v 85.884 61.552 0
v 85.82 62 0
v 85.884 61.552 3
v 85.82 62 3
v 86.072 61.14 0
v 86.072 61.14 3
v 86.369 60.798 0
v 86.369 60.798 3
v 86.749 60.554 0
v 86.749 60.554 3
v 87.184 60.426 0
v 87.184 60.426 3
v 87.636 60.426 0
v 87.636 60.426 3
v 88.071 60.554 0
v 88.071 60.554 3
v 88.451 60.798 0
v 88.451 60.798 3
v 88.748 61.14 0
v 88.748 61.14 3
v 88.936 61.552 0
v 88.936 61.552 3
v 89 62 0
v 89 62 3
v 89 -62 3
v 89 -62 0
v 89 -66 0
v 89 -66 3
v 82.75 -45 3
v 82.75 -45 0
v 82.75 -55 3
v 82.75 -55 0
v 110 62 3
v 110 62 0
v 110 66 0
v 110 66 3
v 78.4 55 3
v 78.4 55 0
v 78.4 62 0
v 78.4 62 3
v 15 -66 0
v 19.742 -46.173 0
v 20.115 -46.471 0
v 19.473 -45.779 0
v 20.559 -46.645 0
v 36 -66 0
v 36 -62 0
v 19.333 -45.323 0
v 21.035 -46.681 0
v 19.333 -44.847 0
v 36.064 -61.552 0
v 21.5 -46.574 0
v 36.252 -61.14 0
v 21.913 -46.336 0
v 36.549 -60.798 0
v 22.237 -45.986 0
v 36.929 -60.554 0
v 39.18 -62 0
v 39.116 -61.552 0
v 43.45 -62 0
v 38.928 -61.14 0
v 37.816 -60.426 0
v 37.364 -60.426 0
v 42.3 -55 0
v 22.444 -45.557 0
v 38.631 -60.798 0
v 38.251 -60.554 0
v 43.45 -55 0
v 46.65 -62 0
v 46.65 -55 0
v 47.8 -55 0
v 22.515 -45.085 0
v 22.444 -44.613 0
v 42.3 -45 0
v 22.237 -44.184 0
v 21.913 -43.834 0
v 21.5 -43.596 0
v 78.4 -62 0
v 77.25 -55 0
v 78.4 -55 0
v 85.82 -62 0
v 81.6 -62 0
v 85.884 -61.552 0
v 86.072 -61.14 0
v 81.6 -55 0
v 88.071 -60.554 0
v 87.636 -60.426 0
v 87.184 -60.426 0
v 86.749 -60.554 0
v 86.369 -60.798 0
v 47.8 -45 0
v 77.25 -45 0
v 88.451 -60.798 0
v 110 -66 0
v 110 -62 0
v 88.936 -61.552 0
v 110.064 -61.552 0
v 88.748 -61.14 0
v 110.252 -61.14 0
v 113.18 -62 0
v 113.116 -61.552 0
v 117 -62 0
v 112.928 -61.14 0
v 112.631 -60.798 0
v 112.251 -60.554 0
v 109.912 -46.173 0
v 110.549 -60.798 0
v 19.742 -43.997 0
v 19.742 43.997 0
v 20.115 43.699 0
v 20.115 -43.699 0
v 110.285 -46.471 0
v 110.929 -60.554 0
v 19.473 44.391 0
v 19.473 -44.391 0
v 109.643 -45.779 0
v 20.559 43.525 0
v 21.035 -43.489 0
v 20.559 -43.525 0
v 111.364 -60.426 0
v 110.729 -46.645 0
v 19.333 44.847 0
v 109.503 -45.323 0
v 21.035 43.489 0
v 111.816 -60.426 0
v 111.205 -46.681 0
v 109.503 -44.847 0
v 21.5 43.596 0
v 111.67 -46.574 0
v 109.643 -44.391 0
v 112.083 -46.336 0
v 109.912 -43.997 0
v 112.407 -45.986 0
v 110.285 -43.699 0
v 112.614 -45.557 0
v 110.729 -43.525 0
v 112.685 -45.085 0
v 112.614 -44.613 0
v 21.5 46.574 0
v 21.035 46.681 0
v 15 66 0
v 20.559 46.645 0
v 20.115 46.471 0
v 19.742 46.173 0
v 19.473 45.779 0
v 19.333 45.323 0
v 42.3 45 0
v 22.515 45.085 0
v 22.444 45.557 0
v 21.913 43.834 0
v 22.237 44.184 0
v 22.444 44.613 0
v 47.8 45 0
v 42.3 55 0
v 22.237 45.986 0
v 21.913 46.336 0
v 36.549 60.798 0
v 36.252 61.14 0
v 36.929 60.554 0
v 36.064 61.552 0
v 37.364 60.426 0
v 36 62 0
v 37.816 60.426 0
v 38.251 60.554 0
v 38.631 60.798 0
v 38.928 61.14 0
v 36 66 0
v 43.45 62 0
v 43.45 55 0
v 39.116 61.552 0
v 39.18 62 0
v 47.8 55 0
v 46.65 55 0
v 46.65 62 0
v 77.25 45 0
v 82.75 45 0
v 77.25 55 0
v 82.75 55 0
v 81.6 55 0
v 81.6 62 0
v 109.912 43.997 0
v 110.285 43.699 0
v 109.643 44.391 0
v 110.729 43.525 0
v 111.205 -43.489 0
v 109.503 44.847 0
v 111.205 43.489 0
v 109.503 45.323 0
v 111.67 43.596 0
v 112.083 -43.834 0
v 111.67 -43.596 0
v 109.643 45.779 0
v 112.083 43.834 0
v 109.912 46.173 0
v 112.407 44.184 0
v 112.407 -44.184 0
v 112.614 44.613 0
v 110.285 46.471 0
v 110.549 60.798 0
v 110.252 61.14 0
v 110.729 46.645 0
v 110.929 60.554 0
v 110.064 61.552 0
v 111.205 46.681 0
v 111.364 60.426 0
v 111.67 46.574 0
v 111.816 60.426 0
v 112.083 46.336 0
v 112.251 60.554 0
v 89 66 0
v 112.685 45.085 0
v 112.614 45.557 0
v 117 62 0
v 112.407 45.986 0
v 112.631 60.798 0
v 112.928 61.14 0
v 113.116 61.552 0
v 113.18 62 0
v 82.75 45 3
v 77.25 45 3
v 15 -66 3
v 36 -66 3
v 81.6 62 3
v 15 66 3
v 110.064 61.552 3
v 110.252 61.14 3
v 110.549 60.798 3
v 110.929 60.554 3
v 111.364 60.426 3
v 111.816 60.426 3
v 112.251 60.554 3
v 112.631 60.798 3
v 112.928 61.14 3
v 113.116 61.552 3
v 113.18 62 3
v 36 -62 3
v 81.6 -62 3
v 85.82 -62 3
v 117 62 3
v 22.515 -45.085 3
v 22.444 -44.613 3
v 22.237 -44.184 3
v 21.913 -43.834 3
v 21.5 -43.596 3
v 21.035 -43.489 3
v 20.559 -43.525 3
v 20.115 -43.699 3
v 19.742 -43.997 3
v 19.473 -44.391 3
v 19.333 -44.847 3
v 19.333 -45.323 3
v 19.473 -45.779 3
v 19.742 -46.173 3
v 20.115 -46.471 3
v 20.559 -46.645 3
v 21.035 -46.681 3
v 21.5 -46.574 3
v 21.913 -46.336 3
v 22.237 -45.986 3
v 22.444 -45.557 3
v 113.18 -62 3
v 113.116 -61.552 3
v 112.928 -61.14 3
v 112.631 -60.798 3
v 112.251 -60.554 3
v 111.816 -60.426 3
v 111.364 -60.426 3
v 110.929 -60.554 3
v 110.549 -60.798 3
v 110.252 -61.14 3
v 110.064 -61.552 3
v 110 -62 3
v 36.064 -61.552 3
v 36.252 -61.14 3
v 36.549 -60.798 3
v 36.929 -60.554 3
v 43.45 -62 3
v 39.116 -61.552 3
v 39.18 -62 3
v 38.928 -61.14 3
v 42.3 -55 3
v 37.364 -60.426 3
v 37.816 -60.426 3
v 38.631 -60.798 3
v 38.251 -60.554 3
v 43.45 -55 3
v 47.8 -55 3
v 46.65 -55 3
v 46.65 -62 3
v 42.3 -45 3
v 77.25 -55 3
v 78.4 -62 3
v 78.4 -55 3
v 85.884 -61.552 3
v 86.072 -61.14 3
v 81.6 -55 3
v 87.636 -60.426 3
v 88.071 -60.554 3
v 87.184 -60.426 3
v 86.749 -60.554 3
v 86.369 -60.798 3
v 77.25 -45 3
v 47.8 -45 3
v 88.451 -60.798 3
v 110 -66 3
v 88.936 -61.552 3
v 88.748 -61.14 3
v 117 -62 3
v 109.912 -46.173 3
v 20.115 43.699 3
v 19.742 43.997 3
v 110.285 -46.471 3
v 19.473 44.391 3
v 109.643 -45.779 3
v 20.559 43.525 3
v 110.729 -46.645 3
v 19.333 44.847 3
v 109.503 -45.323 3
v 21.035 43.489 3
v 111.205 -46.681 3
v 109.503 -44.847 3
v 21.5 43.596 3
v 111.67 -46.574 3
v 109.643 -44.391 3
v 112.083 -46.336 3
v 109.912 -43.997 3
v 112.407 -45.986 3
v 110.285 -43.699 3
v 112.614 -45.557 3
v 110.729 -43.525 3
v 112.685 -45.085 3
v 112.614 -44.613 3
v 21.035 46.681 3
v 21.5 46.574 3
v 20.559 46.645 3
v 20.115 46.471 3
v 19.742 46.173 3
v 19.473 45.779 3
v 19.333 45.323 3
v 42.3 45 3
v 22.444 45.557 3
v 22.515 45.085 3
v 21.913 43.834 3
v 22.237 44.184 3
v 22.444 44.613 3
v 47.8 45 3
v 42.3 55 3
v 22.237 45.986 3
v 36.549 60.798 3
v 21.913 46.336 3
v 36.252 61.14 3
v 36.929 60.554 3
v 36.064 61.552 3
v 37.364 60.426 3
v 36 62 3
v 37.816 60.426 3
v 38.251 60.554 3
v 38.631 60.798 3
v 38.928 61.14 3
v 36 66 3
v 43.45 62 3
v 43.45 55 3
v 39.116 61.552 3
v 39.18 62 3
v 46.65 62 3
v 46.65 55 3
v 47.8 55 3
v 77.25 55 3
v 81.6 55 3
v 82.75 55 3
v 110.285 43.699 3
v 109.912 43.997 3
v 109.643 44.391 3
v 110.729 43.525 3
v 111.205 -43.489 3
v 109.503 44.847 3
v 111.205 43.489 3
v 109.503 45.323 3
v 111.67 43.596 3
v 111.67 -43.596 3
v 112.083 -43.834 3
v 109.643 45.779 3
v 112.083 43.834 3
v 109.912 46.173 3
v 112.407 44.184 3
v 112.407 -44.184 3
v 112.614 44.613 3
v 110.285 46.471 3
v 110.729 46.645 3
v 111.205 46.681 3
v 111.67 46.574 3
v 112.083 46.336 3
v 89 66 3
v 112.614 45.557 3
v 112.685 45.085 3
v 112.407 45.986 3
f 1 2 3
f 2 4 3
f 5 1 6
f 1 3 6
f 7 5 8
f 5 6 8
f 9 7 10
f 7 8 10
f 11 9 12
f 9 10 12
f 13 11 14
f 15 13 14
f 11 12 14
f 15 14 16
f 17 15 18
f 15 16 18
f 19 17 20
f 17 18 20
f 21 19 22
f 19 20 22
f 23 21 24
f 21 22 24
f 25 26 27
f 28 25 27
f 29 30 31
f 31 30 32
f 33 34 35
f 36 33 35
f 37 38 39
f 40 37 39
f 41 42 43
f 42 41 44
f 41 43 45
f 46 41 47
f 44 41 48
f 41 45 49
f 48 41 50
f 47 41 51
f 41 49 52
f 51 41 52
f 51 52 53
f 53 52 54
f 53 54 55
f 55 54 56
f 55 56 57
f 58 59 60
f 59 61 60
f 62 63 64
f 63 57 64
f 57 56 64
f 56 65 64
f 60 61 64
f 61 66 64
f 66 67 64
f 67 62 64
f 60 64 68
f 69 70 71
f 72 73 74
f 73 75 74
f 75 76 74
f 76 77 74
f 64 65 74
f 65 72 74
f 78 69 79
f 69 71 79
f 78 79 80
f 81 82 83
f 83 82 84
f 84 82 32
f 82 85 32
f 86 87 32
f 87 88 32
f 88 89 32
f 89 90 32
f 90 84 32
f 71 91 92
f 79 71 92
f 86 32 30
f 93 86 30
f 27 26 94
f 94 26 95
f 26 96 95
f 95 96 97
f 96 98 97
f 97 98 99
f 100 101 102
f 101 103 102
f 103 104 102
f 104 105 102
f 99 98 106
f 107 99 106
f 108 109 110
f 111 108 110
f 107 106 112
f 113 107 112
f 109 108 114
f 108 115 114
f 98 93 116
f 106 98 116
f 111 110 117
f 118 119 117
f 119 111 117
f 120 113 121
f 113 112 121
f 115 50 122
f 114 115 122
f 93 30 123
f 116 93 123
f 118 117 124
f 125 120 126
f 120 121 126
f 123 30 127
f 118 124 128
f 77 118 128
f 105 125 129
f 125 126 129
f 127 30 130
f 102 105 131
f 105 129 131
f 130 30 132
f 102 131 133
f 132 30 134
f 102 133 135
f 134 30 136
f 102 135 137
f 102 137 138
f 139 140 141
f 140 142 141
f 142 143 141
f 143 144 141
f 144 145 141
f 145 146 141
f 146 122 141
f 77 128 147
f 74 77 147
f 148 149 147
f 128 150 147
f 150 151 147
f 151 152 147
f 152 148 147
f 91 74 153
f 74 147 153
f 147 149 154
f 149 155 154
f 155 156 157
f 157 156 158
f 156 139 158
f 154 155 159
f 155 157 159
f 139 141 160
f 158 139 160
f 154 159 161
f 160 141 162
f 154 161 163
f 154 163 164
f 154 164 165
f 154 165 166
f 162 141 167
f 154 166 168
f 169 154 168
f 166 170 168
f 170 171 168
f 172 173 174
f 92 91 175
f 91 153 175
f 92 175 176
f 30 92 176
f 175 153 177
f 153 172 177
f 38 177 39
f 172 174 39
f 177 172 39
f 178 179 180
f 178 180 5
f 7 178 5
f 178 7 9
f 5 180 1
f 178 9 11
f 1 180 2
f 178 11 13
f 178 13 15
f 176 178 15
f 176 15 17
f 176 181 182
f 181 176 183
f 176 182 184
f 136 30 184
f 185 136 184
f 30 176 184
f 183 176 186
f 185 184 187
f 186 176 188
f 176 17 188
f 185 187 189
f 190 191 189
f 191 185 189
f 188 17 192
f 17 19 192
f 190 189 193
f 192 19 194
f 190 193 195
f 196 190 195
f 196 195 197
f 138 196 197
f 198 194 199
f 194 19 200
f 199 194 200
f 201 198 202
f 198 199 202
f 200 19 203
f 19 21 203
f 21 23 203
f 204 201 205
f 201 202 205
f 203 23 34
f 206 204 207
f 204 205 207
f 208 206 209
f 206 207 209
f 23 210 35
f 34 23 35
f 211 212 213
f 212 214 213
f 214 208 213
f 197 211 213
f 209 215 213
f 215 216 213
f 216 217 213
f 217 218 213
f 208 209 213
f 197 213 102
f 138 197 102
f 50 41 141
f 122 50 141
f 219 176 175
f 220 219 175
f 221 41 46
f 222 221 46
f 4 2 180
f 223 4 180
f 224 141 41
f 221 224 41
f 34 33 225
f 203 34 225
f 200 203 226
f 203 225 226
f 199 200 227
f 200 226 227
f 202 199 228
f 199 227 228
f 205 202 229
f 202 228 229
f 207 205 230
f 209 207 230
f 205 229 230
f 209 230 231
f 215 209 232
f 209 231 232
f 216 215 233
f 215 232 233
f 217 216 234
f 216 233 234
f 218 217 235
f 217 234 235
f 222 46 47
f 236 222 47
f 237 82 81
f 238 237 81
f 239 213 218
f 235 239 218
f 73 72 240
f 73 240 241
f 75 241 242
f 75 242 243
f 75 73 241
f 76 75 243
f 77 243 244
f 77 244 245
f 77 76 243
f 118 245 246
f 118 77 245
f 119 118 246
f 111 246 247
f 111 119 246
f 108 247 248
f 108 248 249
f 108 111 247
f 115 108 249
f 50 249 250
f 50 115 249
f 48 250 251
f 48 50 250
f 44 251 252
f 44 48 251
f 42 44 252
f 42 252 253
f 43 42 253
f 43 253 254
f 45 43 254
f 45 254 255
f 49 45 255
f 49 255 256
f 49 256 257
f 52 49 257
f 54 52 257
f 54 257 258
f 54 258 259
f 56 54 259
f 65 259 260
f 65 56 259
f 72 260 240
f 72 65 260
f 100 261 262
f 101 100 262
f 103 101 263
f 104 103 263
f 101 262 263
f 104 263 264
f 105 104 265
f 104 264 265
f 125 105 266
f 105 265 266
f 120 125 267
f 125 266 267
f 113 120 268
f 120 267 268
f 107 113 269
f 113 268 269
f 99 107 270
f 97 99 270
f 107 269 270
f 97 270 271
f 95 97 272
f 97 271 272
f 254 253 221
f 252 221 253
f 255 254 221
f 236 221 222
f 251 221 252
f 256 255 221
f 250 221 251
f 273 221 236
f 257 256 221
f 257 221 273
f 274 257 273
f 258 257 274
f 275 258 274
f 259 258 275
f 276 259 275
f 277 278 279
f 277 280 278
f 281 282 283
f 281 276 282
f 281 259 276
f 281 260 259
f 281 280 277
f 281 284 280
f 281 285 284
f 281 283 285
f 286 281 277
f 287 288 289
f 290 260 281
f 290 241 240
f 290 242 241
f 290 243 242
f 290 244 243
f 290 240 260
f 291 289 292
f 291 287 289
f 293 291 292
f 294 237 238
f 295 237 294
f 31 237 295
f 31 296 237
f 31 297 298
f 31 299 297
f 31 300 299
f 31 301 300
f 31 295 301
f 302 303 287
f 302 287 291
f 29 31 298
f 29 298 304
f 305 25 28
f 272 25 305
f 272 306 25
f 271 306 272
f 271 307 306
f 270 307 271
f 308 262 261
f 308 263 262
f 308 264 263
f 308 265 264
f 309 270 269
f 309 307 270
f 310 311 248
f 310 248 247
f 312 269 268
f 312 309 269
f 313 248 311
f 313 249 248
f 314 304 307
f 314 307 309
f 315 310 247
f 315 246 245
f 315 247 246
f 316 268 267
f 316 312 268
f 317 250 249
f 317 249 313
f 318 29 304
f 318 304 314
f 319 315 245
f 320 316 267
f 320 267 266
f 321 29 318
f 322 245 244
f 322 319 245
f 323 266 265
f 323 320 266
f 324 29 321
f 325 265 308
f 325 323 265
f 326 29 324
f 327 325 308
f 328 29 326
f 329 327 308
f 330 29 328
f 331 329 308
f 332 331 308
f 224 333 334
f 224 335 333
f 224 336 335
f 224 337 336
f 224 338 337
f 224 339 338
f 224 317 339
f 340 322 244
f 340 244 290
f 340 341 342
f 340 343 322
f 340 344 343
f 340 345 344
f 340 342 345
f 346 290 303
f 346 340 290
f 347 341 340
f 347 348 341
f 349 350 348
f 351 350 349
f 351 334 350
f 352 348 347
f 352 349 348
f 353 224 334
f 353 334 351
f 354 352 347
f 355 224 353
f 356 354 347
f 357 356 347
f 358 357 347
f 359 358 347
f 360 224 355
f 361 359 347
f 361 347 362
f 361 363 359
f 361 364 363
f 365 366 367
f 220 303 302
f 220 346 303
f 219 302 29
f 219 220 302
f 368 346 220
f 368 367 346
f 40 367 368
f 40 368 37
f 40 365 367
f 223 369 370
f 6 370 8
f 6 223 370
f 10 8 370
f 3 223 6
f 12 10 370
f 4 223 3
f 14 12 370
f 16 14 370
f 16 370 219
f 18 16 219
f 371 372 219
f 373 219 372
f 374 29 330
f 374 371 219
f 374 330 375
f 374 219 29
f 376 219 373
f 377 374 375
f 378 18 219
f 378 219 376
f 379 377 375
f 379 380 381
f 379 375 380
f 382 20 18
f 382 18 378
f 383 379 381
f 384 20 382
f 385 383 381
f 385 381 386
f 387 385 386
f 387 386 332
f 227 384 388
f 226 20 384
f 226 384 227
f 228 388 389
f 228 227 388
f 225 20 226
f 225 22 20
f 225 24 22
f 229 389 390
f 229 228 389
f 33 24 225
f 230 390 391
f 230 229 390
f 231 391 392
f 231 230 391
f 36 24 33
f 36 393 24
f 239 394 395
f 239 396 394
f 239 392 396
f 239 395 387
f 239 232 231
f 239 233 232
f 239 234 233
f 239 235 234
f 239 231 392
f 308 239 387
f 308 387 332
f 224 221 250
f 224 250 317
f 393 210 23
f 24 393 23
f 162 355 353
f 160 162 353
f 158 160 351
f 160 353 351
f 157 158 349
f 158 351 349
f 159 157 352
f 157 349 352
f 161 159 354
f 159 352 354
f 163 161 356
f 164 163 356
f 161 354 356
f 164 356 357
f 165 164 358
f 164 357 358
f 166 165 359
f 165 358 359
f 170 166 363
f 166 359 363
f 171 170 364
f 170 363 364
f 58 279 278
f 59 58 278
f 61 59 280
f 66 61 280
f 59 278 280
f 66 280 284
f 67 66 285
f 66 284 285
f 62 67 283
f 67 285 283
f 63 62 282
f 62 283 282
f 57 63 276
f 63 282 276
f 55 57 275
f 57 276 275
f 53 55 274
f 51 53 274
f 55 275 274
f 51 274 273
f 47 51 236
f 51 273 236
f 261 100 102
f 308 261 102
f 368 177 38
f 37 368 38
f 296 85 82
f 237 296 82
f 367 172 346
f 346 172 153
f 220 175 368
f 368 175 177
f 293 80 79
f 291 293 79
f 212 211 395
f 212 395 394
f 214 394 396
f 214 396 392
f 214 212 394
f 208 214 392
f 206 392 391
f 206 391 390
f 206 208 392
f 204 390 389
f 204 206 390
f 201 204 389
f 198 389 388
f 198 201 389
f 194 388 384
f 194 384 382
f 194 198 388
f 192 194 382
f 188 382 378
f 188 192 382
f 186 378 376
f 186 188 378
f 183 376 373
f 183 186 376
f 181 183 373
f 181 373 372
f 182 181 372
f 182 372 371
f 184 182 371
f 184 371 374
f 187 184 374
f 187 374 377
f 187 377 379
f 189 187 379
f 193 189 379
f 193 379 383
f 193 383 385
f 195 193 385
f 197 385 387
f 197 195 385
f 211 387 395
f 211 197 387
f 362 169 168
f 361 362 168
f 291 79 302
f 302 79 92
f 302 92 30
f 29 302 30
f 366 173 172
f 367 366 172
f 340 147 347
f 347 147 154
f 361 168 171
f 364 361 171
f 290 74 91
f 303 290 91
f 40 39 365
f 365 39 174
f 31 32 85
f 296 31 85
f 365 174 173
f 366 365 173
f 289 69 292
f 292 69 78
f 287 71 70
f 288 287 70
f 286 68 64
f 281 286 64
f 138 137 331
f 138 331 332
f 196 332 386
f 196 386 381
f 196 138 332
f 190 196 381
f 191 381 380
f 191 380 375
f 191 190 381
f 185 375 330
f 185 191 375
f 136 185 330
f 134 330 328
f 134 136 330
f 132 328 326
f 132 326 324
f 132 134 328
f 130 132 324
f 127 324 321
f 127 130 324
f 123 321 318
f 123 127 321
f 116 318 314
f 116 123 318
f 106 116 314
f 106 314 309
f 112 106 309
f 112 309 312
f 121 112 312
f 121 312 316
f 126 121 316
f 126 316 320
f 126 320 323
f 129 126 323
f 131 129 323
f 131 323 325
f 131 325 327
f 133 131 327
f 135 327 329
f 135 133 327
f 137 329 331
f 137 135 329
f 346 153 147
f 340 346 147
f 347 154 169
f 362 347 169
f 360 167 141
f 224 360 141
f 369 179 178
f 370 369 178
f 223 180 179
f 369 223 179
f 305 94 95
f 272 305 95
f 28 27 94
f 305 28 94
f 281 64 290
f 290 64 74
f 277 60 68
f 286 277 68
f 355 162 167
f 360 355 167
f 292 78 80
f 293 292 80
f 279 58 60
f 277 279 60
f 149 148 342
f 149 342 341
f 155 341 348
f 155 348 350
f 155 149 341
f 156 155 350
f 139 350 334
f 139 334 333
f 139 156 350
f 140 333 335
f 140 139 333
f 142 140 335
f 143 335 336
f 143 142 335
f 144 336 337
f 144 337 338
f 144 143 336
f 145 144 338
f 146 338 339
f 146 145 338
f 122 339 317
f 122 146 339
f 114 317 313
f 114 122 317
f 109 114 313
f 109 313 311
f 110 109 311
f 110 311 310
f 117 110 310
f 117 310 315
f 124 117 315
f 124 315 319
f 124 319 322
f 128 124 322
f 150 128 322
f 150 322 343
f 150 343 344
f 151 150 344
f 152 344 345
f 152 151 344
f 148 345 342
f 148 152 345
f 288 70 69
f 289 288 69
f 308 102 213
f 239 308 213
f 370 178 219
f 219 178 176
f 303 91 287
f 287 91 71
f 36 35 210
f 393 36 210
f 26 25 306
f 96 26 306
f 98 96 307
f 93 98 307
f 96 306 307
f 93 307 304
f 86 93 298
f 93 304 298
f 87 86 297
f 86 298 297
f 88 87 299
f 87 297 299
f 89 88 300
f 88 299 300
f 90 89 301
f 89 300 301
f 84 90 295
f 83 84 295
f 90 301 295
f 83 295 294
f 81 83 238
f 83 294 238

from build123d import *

# Parameters (mm, degrees)
MODEL_R             = 1.6
BOSS_EXTRUDE1_DEPTH = 3
SKETCH2_R           = 1.59
CUT_EXTRUDE1_DEPTH  = 135.365174059


with BuildPart() as part:
    # Model → Boss-Extrude1 (new body)
    with BuildSketch(Plane.XY):
        Polygon((110, -66), (110, -62), (117, -62), (117, 62), (110, 62), (110, 66), (89, 66), (89, 62), (81.6, 62), (81.6, 55), (82.75, 55), (82.75, 45), (77.25, 45), (77.25, 55), (78.4, 55), (78.4, 62), (46.65, 62), (46.65, 55), (47.8, 55), (47.8, 45), (42.3, 45), (42.3, 55), (43.45, 55), (43.45, 62), (36, 62), (36, 66), (15, 66), (15, -66), (36, -66), (36, -62), (43.45, -62), (43.45, -55), (42.3, -55), (42.3, -45), (47.8, -45), (47.8, -55), (46.65, -55), (46.65, -62), (78.4, -62), (78.4, -55), (77.25, -55), (77.25, -45), (82.75, -45), (82.75, -55), (81.6, -55), (81.6, -62), (89, -62), (89, -66), align=None)
        with Locations((111.085, -45.085)):
            Circle(MODEL_R, mode=Mode.SUBTRACT)
        with Locations((111.085, 45.085)):
            Circle(MODEL_R, mode=Mode.SUBTRACT)
        with Locations((20.915, 45.085)):
            Circle(MODEL_R, mode=Mode.SUBTRACT)
        with Locations((20.915, -45.085)):
            Circle(MODEL_R, mode=Mode.SUBTRACT)
    extrude(amount=BOSS_EXTRUDE1_DEPTH)

    # Sketch2 → Cut-Extrude1 (cut, through all)
    with BuildSketch(Plane.XY.offset(3)):
        with Locations((37.59, 62)):
            Circle(SKETCH2_R)
        with Locations((87.41, 62)):
            Circle(SKETCH2_R)
        with Locations((37.59, -62)):
            Circle(SKETCH2_R)
        with Locations((87.41, -62)):
            Circle(SKETCH2_R)
        with Locations((111.59, -62)):
            Circle(SKETCH2_R)
        with Locations((111.59, 62)):
            Circle(SKETCH2_R)
    extrude(amount=-CUT_EXTRUDE1_DEPTH, mode=Mode.SUBTRACT)


solid = part.part
